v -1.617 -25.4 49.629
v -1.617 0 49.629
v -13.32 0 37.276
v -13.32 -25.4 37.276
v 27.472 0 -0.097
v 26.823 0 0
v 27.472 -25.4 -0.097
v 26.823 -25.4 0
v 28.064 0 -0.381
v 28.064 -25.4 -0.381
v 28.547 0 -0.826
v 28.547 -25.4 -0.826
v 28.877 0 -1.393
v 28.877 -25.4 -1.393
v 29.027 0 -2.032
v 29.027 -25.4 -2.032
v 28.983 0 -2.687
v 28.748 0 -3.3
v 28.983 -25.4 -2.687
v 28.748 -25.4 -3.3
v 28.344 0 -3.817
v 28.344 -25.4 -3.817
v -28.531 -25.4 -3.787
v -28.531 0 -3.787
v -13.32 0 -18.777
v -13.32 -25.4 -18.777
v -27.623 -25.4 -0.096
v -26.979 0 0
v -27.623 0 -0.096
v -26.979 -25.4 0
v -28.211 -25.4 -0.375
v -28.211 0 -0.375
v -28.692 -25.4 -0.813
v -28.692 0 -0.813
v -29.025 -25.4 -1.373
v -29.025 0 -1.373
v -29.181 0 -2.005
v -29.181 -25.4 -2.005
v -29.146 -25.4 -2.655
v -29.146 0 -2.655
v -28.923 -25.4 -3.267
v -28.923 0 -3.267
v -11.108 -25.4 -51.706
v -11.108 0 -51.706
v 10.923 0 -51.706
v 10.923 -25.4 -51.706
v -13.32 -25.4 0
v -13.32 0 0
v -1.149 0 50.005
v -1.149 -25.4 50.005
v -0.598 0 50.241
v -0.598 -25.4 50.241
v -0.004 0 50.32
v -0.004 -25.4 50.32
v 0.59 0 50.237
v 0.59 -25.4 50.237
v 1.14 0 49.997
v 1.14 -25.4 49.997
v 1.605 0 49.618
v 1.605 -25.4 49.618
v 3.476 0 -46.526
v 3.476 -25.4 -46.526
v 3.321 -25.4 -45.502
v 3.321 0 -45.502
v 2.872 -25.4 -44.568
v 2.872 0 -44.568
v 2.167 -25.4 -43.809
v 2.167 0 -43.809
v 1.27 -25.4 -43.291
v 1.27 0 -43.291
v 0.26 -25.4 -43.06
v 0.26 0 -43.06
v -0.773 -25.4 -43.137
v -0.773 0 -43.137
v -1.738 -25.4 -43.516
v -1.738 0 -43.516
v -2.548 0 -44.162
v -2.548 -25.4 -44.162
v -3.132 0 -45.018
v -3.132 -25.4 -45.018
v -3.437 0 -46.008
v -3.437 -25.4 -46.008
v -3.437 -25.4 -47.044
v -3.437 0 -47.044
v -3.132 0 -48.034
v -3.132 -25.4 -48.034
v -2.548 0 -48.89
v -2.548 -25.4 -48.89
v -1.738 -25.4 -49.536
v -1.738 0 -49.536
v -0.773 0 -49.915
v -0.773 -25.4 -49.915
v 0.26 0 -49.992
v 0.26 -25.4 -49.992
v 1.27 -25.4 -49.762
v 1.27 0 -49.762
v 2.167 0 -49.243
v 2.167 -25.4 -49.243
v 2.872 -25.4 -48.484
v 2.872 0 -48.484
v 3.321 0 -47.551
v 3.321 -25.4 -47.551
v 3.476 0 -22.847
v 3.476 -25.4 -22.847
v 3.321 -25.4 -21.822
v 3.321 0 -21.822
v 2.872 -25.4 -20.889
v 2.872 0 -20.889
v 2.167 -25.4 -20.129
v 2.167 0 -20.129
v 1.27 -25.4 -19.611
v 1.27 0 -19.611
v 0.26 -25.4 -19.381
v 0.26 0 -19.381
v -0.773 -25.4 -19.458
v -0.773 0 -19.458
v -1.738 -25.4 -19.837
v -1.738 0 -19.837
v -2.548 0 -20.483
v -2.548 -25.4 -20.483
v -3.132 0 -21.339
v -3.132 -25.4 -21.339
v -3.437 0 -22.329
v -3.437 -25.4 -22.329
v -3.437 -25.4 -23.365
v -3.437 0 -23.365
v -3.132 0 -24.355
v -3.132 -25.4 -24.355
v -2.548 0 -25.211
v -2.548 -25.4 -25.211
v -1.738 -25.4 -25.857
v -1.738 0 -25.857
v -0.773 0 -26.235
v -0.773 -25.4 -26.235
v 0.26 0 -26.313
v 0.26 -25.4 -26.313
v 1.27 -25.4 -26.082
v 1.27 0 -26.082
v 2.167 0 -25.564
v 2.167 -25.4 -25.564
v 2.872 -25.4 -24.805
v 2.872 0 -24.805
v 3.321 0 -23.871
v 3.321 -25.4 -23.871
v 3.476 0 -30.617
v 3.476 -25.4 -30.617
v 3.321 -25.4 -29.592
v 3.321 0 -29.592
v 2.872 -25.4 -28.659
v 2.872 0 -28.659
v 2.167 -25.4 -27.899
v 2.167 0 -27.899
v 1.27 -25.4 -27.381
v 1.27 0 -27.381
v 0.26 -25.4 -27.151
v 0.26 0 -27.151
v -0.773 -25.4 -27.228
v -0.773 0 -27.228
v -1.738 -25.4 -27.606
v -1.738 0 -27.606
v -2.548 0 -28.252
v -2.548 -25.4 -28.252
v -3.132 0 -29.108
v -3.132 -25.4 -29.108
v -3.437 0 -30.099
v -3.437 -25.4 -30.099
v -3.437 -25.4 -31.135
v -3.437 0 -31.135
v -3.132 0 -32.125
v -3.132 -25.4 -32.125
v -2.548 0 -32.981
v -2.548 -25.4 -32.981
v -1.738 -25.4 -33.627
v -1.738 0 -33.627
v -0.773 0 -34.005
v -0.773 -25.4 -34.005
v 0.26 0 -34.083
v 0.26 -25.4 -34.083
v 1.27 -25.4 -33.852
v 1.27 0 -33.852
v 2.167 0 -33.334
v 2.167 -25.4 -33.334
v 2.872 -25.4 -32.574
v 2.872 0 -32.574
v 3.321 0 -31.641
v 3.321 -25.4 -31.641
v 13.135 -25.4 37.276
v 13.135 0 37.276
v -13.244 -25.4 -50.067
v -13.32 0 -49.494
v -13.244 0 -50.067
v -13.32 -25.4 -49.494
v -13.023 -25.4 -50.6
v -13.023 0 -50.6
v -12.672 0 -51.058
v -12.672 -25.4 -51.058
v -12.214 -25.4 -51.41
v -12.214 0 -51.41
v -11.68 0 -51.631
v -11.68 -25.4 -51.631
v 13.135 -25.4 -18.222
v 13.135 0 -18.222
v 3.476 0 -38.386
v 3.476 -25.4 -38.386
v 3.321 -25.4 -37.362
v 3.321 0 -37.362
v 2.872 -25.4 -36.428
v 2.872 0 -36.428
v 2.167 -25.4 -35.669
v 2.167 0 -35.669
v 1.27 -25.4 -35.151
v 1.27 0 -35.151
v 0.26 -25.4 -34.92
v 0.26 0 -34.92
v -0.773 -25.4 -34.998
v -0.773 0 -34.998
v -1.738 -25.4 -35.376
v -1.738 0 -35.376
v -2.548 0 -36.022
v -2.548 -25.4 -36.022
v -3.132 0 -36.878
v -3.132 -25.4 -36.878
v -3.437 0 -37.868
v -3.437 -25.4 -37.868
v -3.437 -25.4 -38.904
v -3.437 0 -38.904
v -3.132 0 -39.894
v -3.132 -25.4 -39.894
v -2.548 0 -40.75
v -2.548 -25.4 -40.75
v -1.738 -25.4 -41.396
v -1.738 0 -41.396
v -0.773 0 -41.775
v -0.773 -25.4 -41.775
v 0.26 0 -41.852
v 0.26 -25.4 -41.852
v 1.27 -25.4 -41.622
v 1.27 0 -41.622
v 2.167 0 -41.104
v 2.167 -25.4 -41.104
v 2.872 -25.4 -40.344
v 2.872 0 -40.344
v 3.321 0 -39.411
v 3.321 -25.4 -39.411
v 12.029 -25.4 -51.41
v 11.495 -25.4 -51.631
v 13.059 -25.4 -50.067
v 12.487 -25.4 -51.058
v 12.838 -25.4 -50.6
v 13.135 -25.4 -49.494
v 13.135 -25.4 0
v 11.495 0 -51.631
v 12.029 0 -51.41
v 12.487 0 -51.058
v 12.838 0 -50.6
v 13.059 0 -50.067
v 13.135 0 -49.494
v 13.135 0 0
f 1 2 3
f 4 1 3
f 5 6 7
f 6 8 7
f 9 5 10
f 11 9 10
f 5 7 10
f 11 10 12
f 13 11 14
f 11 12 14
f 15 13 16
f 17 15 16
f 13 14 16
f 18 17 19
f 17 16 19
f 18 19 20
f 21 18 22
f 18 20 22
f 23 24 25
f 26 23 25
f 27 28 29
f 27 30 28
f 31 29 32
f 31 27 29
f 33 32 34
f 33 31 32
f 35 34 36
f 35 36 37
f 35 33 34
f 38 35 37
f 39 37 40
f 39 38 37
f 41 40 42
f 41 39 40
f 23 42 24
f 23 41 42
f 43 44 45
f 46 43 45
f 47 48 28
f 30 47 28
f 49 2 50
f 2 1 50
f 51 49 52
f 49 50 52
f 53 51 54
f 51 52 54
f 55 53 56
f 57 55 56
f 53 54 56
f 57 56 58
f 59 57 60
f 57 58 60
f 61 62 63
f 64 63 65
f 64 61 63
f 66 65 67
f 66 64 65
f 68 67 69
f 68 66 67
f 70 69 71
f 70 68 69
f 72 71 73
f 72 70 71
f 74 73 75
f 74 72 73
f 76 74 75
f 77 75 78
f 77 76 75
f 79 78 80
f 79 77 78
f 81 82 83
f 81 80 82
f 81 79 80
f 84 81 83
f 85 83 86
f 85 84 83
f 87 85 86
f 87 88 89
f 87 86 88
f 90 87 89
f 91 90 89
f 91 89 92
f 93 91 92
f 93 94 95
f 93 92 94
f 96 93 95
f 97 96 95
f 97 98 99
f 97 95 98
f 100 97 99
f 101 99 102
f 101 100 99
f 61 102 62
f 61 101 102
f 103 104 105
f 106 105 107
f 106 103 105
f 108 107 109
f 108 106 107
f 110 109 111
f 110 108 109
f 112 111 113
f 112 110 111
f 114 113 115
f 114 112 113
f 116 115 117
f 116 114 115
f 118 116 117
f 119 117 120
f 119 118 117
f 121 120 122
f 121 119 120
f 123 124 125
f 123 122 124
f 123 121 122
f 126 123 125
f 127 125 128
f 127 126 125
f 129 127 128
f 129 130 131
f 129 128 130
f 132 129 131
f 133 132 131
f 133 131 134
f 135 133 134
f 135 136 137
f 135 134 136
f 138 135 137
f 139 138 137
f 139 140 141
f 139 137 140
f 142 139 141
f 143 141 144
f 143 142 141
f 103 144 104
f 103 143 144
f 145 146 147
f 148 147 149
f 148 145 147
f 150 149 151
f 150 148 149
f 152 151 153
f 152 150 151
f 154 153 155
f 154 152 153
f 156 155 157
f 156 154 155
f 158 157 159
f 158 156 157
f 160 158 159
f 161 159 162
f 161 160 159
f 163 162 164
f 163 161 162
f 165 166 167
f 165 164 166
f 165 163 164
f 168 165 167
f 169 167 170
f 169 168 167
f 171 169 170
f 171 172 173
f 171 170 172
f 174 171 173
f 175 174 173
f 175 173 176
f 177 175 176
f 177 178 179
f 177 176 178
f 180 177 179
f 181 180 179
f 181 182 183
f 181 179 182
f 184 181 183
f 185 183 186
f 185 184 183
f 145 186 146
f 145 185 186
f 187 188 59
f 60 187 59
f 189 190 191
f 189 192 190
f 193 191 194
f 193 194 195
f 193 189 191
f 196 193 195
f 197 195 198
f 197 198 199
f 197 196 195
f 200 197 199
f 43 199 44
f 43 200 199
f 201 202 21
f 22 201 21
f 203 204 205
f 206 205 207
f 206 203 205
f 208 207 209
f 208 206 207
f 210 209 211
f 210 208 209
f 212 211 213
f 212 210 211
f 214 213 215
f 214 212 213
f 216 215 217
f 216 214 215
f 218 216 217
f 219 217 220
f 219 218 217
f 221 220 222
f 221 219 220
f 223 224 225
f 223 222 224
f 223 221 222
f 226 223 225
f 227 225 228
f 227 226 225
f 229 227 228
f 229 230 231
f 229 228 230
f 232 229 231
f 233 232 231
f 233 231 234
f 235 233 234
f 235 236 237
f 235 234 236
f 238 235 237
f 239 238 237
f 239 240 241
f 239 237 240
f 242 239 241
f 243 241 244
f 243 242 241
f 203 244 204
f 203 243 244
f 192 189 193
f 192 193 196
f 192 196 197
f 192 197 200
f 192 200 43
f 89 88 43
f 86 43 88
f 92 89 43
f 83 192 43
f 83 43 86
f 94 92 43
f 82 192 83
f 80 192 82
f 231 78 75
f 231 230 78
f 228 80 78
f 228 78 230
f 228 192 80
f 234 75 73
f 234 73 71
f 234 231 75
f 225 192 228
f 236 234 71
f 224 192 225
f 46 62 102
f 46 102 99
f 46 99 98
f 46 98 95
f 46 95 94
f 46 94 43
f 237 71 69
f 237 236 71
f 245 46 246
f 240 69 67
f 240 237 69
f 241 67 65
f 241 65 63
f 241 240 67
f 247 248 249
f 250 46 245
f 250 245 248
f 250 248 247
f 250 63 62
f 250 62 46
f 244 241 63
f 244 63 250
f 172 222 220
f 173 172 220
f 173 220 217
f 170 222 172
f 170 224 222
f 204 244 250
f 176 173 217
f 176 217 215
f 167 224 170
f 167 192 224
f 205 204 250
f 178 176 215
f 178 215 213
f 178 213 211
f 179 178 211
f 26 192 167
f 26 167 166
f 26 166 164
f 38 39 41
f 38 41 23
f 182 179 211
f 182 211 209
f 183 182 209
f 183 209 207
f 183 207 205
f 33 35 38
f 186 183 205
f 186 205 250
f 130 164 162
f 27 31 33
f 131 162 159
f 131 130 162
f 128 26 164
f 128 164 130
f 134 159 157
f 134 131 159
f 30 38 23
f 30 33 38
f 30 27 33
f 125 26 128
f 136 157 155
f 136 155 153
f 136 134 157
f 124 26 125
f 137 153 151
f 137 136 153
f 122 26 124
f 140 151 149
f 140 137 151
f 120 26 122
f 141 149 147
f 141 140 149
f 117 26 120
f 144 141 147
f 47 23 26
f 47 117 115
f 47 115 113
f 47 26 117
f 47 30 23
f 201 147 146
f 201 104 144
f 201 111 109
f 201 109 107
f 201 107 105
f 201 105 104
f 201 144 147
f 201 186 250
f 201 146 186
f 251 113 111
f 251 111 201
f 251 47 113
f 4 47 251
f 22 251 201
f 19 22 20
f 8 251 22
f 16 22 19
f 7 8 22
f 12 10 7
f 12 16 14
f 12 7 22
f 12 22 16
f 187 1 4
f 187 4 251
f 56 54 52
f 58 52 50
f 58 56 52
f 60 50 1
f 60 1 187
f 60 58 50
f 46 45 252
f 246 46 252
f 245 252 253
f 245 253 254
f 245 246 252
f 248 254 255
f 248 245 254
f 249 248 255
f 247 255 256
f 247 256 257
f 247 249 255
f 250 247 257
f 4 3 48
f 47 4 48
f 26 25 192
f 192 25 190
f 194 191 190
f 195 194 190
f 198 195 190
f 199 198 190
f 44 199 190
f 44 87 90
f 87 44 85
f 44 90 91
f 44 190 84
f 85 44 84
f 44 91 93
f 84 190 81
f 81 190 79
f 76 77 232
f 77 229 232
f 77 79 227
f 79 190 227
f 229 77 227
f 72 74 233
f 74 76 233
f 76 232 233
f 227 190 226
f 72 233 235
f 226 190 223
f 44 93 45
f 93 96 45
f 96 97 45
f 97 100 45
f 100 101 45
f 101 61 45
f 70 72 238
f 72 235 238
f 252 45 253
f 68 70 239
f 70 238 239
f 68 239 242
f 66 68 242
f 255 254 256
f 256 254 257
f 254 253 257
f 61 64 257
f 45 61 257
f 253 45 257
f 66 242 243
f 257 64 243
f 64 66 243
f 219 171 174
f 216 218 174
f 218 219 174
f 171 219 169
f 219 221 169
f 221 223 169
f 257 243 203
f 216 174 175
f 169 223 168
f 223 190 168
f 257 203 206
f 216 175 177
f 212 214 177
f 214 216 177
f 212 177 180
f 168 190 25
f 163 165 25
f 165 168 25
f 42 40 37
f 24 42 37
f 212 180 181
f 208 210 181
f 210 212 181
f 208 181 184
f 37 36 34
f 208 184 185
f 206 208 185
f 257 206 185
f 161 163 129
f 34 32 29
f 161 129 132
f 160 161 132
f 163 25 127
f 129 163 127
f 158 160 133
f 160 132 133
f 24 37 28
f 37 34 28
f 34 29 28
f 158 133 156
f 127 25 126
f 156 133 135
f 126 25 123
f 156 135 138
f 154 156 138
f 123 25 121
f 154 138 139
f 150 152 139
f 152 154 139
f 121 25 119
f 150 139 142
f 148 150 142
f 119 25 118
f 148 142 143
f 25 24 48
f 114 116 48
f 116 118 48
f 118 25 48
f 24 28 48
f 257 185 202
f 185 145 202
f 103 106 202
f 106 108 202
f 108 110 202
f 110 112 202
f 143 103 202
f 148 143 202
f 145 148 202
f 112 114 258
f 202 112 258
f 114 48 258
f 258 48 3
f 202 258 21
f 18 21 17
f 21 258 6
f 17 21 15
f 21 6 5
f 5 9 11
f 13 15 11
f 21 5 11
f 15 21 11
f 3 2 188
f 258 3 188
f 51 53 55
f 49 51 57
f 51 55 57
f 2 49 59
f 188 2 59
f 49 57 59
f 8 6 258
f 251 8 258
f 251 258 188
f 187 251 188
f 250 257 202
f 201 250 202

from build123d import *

# Parameters (mm, degrees)
F1_DEPTH = 25.4
F2_R     = 3.4757285613
F3_DEPTH = 25.401
F6_R     = 2.2115163873


# Not quite as in the source:
# - the program builds the solid bodies; features that only make, move or delete a surface that nothing else refers to are left out


with BuildPart() as f1:
    # F0 (on Front) → F1 (new body)
    with BuildSketch(Plane.XZ):
        Polygon((-13.319584541, 37.2763350606), (-13.319584541, 0), (-32.3739908636, 0), (-13.319584541, -18.7769141048), (-13.319584541, -51.7058856785), (13.1345912814, -51.7058856785), (13.1345912814, -18.221931532), (32.3739871383, 0), (13.1345912814, 0), (13.1345912814, 37.2763350606), (0, 51.3358972967), align=None)
    extrude(amount=F1_DEPTH)

    # F2 (on Front) → F3 (cut, through all)
    with BuildSketch(Plane.XZ):
        with Locations((0, -22.8467863053)):
            Circle(F2_R)
        with Locations((0, -30.6165441871)):
            Circle(F2_R)
        with Locations((0, -38.3863002062)):
            Circle(F2_R)
        with Locations((0, -46.5260483325)):
            Circle(F2_R)
    extrude(amount=F3_DEPTH, mode=Mode.SUBTRACT)

    # F6
    f6_edges = [f1.edges().sort_by_distance(p)[0] for p in [
        (-32.373991, -12.7, 0),
        (32.373987, -12.7, 0),
        (-13.319585, -12.7, -51.705886),
        (13.134591, -12.7, -51.705886),
        (0, -12.7, 51.335897),
    ]]
    fillet(f6_edges, radius=F6_R)


solid = f1.part
